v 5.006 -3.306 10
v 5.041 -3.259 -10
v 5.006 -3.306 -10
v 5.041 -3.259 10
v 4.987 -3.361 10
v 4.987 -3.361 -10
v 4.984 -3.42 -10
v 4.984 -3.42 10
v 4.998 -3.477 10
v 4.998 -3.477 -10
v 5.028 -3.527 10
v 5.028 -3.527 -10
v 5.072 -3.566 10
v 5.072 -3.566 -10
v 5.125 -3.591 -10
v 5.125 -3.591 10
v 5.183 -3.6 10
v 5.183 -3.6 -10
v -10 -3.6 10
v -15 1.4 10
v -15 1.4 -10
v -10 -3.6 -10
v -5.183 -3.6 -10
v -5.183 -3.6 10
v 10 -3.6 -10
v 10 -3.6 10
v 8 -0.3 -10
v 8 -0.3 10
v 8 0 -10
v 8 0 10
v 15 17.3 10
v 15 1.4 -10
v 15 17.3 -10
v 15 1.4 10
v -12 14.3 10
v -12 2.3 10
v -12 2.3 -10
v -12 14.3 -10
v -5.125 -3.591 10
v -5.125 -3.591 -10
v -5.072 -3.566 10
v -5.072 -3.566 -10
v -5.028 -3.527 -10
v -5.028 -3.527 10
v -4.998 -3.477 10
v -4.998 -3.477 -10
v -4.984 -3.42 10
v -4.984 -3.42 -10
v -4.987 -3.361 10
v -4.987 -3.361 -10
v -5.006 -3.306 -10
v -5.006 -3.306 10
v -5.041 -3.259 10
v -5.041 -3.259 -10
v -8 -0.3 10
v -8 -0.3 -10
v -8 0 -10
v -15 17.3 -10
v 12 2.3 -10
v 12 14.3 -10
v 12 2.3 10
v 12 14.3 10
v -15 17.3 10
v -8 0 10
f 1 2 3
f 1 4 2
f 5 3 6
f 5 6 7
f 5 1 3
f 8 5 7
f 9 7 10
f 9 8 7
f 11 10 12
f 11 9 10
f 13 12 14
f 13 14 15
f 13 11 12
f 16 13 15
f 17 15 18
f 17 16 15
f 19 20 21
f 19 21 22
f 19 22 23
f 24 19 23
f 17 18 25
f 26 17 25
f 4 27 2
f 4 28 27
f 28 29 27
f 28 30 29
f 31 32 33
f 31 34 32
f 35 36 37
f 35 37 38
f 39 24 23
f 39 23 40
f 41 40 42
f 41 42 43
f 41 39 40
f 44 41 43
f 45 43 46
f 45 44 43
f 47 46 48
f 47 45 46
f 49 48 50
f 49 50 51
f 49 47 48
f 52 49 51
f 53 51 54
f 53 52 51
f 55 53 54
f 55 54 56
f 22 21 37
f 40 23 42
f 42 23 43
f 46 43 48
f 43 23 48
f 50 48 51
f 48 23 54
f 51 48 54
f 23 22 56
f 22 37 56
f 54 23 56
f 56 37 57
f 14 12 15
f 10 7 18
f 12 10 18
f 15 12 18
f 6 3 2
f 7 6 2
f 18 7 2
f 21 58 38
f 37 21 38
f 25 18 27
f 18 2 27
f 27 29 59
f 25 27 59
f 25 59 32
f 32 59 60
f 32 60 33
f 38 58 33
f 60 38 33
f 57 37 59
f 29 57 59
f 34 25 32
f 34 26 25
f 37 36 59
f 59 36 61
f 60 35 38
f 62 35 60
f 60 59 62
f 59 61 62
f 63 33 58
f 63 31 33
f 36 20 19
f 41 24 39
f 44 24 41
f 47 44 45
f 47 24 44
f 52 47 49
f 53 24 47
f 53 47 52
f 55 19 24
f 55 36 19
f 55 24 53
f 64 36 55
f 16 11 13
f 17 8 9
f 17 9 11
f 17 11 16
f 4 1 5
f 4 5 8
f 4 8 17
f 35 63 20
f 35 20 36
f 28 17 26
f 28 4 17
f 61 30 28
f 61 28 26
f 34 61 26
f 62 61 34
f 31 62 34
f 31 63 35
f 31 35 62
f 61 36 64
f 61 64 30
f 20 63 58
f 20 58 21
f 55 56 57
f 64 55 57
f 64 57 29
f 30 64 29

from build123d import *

# Parameters (mm, degrees)
F0_W     = 24
F0_H     = 12
F1_DEPTH = 10


with BuildPart() as f1:
    # F0 (on Top) → F1 (new body, symmetric)
    with BuildSketch(Plane.XY):
        with BuildLine():
            Line((15, 17.3), (-15, 17.3))
            Line((-15, 17.3), (-15, 1.4))
            Line((-15, 1.4), (-10, -3.6))
            Line((-10, -3.6), (-5.1828427125, -3.6))
            ThreePointArc((-5.1828427125, -3.6), (-4.998066806, -3.4765366865), (-5.0414213562, -3.2585786438))
            Line((-5.0414213562, -3.2585786438), (-8, -0.3))
            Line((-8, -0.3), (-8, 0))
            Line((-8, 0), (8, 0))
            Line((8, 0), (8, -0.3))
            Line((8, -0.3), (5.0414213562, -3.2585786438))
            ThreePointArc((5.0414213562, -3.2585786438), (4.998066806, -3.4765366865), (5.1828427125, -3.6))
            Line((5.1828427125, -3.6), (10, -3.6))
            Line((10, -3.6), (15, 1.4))
            Line((15, 1.4), (15, 17.3))
        make_face()
        with Locations((0, 8.3)):
            Rectangle(F0_W, F0_H, mode=Mode.SUBTRACT)
    extrude(amount=F1_DEPTH, both=True)


solid = f1.part
